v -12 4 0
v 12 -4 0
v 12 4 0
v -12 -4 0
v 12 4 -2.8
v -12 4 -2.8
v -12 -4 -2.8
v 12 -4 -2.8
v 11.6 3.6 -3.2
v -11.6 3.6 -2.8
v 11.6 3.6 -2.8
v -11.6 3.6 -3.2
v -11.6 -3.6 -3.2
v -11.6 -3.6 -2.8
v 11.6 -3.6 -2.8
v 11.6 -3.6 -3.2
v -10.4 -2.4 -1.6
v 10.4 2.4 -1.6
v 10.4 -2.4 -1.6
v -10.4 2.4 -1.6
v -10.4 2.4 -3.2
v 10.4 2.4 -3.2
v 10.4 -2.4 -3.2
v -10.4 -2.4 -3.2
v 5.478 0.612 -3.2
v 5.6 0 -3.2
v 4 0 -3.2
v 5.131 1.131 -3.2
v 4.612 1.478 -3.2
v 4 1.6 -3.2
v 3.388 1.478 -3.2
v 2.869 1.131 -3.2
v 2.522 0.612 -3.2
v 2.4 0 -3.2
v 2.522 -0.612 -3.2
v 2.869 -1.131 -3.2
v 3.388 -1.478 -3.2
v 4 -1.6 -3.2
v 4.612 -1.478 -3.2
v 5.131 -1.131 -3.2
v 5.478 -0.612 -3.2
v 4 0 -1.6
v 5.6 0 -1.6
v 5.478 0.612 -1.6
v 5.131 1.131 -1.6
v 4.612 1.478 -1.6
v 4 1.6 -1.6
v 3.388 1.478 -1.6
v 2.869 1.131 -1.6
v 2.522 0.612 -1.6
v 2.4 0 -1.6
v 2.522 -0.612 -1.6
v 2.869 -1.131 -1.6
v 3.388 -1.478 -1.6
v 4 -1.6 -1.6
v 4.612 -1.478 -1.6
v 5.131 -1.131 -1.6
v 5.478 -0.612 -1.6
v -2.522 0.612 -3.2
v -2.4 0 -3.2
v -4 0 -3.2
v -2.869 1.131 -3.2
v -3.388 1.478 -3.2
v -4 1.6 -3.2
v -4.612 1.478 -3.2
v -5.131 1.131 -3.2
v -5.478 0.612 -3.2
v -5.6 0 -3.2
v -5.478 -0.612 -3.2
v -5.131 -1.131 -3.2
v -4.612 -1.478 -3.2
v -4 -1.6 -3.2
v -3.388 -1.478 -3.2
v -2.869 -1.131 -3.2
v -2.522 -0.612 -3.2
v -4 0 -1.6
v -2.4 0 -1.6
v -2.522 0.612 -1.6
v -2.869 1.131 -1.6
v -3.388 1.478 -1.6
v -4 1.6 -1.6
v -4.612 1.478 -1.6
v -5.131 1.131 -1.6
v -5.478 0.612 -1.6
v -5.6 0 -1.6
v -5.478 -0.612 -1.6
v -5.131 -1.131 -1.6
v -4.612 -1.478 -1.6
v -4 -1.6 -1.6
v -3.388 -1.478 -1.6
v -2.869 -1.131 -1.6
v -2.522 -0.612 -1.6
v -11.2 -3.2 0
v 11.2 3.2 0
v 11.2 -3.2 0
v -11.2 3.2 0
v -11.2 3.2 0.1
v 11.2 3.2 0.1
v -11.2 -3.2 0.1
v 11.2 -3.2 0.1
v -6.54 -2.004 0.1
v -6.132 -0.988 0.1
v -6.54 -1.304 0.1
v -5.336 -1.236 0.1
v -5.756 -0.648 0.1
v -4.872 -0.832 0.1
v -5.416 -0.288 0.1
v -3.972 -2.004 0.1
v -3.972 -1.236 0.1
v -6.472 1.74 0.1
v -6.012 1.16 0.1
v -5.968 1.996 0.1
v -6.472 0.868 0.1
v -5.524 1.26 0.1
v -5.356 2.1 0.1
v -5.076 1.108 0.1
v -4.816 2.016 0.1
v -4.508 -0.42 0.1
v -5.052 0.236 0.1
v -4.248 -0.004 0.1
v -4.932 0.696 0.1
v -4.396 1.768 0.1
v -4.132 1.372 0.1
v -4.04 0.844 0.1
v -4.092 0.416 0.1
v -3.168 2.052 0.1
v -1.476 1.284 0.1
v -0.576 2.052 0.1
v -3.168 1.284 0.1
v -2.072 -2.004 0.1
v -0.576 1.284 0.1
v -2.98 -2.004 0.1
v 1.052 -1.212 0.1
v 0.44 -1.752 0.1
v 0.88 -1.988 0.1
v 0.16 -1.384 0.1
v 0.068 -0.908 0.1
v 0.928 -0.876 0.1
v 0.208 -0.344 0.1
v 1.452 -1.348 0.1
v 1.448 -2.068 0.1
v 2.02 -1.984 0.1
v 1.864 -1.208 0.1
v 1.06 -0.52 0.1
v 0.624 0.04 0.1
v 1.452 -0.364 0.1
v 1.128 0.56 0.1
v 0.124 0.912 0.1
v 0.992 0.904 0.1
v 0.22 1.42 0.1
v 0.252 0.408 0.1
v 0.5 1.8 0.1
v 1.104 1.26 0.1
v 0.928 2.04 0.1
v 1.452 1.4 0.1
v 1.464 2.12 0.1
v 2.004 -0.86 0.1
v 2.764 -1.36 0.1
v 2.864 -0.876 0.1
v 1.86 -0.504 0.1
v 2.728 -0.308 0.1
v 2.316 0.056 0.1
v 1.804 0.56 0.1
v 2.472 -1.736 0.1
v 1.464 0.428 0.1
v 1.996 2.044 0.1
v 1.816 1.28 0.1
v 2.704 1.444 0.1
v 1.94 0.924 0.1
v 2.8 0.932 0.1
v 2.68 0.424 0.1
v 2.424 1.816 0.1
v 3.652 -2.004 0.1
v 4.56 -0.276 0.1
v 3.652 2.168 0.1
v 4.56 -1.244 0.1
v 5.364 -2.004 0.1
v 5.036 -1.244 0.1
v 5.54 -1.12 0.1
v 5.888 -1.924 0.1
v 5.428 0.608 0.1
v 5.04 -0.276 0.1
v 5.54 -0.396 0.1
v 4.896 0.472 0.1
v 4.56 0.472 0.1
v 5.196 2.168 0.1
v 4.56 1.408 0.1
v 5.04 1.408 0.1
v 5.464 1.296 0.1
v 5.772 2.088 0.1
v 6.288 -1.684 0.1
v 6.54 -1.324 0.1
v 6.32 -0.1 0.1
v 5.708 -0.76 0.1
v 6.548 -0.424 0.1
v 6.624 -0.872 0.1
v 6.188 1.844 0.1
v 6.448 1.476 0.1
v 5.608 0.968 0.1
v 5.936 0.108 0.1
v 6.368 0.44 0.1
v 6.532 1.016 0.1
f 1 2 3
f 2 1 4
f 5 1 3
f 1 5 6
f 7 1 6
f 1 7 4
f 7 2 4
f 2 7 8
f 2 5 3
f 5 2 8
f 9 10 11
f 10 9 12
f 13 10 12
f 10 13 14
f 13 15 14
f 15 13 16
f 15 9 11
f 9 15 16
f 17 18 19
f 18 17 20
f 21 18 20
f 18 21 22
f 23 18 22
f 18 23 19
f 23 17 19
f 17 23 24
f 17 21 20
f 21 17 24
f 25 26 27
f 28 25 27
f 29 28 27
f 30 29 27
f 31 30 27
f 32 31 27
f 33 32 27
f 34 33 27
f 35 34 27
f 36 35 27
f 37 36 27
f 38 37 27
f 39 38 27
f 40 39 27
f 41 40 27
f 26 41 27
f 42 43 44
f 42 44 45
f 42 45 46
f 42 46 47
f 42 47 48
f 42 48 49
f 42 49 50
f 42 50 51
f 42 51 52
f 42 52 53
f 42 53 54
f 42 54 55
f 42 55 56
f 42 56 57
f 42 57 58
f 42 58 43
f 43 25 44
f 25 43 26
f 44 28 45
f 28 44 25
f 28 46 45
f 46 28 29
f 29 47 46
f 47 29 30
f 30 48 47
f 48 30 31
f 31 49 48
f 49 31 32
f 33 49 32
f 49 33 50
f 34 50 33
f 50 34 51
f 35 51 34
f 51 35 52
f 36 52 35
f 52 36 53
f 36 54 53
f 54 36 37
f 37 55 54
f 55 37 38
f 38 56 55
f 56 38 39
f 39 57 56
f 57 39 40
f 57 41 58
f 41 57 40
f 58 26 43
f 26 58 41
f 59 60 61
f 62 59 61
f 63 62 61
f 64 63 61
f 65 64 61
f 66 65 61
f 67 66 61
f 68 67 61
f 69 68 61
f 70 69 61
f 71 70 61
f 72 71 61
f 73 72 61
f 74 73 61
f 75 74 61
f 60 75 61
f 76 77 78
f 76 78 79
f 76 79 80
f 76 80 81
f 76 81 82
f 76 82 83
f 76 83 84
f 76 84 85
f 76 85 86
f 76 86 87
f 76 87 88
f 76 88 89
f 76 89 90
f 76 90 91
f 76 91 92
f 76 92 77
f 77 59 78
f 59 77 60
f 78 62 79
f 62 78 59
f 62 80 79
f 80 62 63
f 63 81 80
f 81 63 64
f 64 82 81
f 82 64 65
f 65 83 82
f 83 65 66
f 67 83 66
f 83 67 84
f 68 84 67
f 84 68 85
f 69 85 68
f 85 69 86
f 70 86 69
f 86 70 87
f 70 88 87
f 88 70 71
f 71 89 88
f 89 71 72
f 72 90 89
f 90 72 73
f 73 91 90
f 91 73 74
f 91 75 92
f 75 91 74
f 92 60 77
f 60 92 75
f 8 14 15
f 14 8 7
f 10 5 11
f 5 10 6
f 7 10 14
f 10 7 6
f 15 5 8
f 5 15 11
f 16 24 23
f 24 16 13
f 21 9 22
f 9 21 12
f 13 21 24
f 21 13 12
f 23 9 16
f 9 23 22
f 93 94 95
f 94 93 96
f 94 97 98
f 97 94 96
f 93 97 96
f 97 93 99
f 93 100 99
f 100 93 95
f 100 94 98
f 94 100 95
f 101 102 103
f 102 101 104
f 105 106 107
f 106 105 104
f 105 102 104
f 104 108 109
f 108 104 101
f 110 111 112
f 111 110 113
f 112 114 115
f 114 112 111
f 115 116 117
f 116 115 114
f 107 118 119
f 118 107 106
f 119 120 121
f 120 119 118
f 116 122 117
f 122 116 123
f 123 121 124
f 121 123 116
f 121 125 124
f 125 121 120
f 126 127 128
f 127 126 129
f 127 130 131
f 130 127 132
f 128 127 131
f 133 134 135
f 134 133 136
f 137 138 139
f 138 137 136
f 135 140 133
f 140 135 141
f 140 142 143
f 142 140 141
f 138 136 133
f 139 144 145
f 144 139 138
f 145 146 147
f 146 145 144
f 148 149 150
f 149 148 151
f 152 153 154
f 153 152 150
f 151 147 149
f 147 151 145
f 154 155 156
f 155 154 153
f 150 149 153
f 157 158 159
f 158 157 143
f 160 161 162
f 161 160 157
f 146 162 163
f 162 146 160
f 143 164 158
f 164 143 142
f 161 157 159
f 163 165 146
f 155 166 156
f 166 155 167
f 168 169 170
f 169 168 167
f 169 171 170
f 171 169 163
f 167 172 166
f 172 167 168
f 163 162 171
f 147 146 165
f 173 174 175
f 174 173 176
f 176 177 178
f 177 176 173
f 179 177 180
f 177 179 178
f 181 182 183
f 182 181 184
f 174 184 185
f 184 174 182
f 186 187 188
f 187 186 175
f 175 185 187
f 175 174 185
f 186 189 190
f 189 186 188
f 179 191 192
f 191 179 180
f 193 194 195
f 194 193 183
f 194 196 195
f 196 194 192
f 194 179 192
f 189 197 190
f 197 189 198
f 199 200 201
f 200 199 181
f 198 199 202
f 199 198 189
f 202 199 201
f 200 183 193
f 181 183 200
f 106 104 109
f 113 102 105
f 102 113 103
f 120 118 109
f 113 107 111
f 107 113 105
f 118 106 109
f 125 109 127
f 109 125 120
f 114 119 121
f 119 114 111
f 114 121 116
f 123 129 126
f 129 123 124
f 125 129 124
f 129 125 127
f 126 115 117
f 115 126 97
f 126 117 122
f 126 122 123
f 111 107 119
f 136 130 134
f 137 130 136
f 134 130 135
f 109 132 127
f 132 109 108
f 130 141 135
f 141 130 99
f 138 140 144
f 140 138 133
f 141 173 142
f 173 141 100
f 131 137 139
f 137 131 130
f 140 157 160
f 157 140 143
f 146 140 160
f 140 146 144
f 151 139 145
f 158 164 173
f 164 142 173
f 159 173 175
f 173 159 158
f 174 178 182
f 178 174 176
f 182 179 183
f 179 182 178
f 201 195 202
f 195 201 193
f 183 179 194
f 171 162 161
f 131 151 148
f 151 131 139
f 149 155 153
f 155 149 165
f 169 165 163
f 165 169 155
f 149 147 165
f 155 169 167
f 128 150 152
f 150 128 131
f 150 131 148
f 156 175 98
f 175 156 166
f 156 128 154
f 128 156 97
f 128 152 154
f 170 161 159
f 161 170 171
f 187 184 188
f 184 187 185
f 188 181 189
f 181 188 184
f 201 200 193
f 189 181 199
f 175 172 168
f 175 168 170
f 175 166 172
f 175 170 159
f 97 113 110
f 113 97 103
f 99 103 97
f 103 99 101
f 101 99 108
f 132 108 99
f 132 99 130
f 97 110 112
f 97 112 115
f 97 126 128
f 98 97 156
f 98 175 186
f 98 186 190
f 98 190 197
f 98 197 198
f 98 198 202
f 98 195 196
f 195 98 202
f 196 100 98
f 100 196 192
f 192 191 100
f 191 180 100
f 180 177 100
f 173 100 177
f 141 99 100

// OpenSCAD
// file: ../p/4-4edge.scad
use <../lib.scad>
function ldraw_lib__4_4edge() = [
// 0 Circle 1.0
// 0 Name: 4-4edge.dat
// 0 Author: James Jessiman
// 0 !LDRAW_ORG Primitive UPDATE 2017-01
// 0 !LICENSE Licensed under CC BY 2.0 and CC BY 4.0 : see CAreadme.txt
// 
// 0 BFC CERTIFY CCW
  [0,"BFC","CERTIFY"],
  [0,"BFC","CCW"],
// 
// 0 !HISTORY 1998-12-15 [PTadmin] Official Update 1998-10
// 0 !HISTORY 2005-12-28 [PTadmin] Official Update 2005-01
// 0 !HISTORY 2007-06-24 [PTadmin] Header formatted for Contributor Agreement
// 0 !HISTORY 2008-07-01 [PTadmin] Official Update 2008-01
// 0 !HISTORY 2017-01-15 [Steffen] BFCed
// 0 !HISTORY 2017-12-30 [PTadmin] Official Update 2017-01
// 
// 
// 2 24 1 0 0 0.9239 0 0.3827
  [2,24,1,0,0,0.9239,0,0.3827],
// 2 24 0.9239 0 0.3827 0.7071 0 0.7071
  [2,24,0.9239,0,0.3827,0.7071,0,0.7071],
// 2 24 0.7071 0 0.7071 0.3827 0 0.9239
  [2,24,0.7071,0,0.7071,0.3827,0,0.9239],
// 2 24 0.3827 0 0.9239 0 0 1
  [2,24,0.3827,0,0.9239,0,0,1],
// 2 24 0 0 1 -0.3827 0 0.9239
  [2,24,0,0,1,-0.3827,0,0.9239],
// 2 24 -0.3827 0 0.9239 -0.7071 0 0.7071
  [2,24,-0.3827,0,0.9239,-0.7071,0,0.7071],
// 2 24 -0.7071 0 0.7071 -0.9239 0 0.3827
  [2,24,-0.7071,0,0.7071,-0.9239,0,0.3827],
// 2 24 -0.9239 0 0.3827 -1 0 -0
  [2,24,-0.9239,0,0.3827,-1,0,-0],
// 2 24 -1 0 -0 -0.9239 0 -0.3827
  [2,24,-1,0,-0,-0.9239,0,-0.3827],
// 2 24 -0.9239 0 -0.3827 -0.7071 0 -0.7071
  [2,24,-0.9239,0,-0.3827,-0.7071,0,-0.7071],
// 2 24 -0.7071 0 -0.7071 -0.3827 0 -0.9239
  [2,24,-0.7071,0,-0.7071,-0.3827,0,-0.9239],
// 2 24 -0.3827 0 -0.9239 0 0 -1
  [2,24,-0.3827,0,-0.9239,0,0,-1],
// 2 24 0 0 -1 0.3827 0 -0.9239
  [2,24,0,0,-1,0.3827,0,-0.9239],
// 2 24 0.3827 0 -0.9239 0.7071 0 -0.7071
  [2,24,0.3827,0,-0.9239,0.7071,0,-0.7071],
// 2 24 0.7071 0 -0.7071 0.9239 0 -0.3827
  [2,24,0.7071,0,-0.7071,0.9239,0,-0.3827],
// 2 24 0.9239 0 -0.3827 1 0 0
  [2,24,0.9239,0,-0.3827,1,0,0],
];
module ldraw_lib__4_4edge(step=0, col=false, unit=2/5, alt=false, line=0.2, solid=!$preview)
    makepoly(ldraw_lib__4_4edge(), step=step, col=col, unit=unit, alt=alt, line=line, solid=solid);
ldraw_lib__4_4edge(line=0.2);
// file: ../p/4-4disc.scad
use <../lib.scad>
function ldraw_lib__4_4disc() = [
// 0 Disc 1.0
// 0 Name: 4-4disc.dat
// 0 Author: James Jessiman
// 0 !LDRAW_ORG Primitive UPDATE 2002-02
// 0 !LICENSE Licensed under CC BY 2.0 and CC BY 4.0 : see CAreadme.txt
// 
// 0 BFC CERTIFY CCW
  [0,"BFC","CERTIFY"],
  [0,"BFC","CCW"],
// 
// 0 !HISTORY 1998-12-15 [PTadmin] Official Update 1998-10
// 0 !HISTORY 2002-03-23 [sbliss] Added BFC statement
// 0 !HISTORY 2002-04-25 [PTadmin] Official Update 2002-02
// 0 !HISTORY 2007-06-24 [PTadmin] Header formatted for Contributor Agreement
// 0 !HISTORY 2008-07-01 [PTadmin] Official Update 2008-01
// 
// 
// 3 16 0 0 0 1 0 0 0.9239 0 0.3827
  [3,16,0,0,0,1,0,0,0.9239,0,0.3827],
// 3 16 0 0 0 0.9239 0 0.3827 0.7071 0 0.7071
  [3,16,0,0,0,0.9239,0,0.3827,0.7071,0,0.7071],
// 3 16 0 0 0 0.7071 0 0.7071 0.3827 0 0.9239
  [3,16,0,0,0,0.7071,0,0.7071,0.3827,0,0.9239],
// 3 16 0 0 0 0.3827 0 0.9239 0 0 1
  [3,16,0,0,0,0.3827,0,0.9239,0,0,1],
// 3 16 0 0 0 0 0 1 -0.3827 0 0.9239
  [3,16,0,0,0,0,0,1,-0.3827,0,0.9239],
// 3 16 0 0 0 -0.3827 0 0.9239 -0.7071 0 0.7071
  [3,16,0,0,0,-0.3827,0,0.9239,-0.7071,0,0.7071],
// 3 16 0 0 0 -0.7071 0 0.7071 -0.9239 0 0.3827
  [3,16,0,0,0,-0.7071,0,0.7071,-0.9239,0,0.3827],
// 3 16 0 0 0 -0.9239 0 0.3827 -1 0 -0
  [3,16,0,0,0,-0.9239,0,0.3827,-1,0,-0],
// 3 16 0 0 0 -1 0 -0 -0.9239 0 -0.3827
  [3,16,0,0,0,-1,0,-0,-0.9239,0,-0.3827],
// 3 16 0 0 0 -0.9239 0 -0.3827 -0.7071 0 -0.7071
  [3,16,0,0,0,-0.9239,0,-0.3827,-0.7071,0,-0.7071],
// 3 16 0 0 0 -0.7071 0 -0.7071 -0.3827 0 -0.9239
  [3,16,0,0,0,-0.7071,0,-0.7071,-0.3827,0,-0.9239],
// 3 16 0 0 0 -0.3827 0 -0.9239 0 0 -1
  [3,16,0,0,0,-0.3827,0,-0.9239,0,0,-1],
// 3 16 0 0 0 0 0 -1 0.3827 0 -0.9239
  [3,16,0,0,0,0,0,-1,0.3827,0,-0.9239],
// 3 16 0 0 0 0.3827 0 -0.9239 0.7071 0 -0.7071
  [3,16,0,0,0,0.3827,0,-0.9239,0.7071,0,-0.7071],
// 3 16 0 0 0 0.7071 0 -0.7071 0.9239 0 -0.3827
  [3,16,0,0,0,0.7071,0,-0.7071,0.9239,0,-0.3827],
// 3 16 0 0 0 0.9239 0 -0.3827 1 0 0
  [3,16,0,0,0,0.9239,0,-0.3827,1,0,0],
// 0
];
module ldraw_lib__4_4disc(step=0, col=false, unit=2/5, alt=false, line=0.2, solid=!$preview)
    makepoly(ldraw_lib__4_4disc(), step=step, col=col, unit=unit, alt=alt, line=line, solid=solid);
ldraw_lib__4_4disc(line=0.2);
// file: ../p/4-4cyli.scad
use <../lib.scad>
$fa=1; $fs=0.2;
function ldraw_lib__4_4cyli(realsolid=false) = [
// 0 Cylinder 1.0
// 0 Name: 4-4cyli.dat
// 0 Author: James Jessiman
// 0 !LDRAW_ORG Primitive UPDATE 2005-01
// 0 !LICENSE Licensed under CC BY 2.0 and CC BY 4.0 : see CAreadme.txt
// 
// 0 BFC CERTIFY CCW
  [0,"BFC","CERTIFY"],
  [0,"BFC","CCW"],
// 
// 0 !HISTORY 1998-12-15 [PTadmin] Official Update 1998-10
// 0 !HISTORY 2002-03-23 [sbliss] Added BFC statement; merged headers from files in distributions LDraw 0.27 and Complete.
// 0 !HISTORY 2002-04-25 [PTadmin] Official Update 2002-02
// 0 !HISTORY 2004-12-14 [guyvivan] BFC CCW
// 0 !HISTORY 2005-12-28 [PTadmin] Official Update 2005-01
// 0 !HISTORY 2007-06-24 [PTadmin] Header formatted for Contributor Agreement
// 0 !HISTORY 2008-07-01 [PTadmin] Official Update 2008-01
// 
// 
// 4 16 1 1 0 0.9239 1 0.3827 0.9239 0 0.3827 1 0 0
  [4,16,1,1,0,0.9239,1,0.3827,0.9239,0,0.3827,1,0,0],
// 5 24 1 0 0 1 1 0 0.9239 0 0.3827 0.9239 0 -0.3827
  [5,24,1,0,0,1,1,0,0.9239,0,0.3827,0.9239,0,-0.3827],
// 4 16 0.9239 1 0.3827 0.7071 1 0.7071 0.7071 0 0.7071 0.9239 0 0.3827
  [4,16,0.9239,1,0.3827,0.7071,1,0.7071,0.7071,0,0.7071,0.9239,0,0.3827],
// 5 24 0.9239 0 0.3827 0.9239 1 0.3827 0.7071 0 0.7071 1 0 0
  [5,24,0.9239,0,0.3827,0.9239,1,0.3827,0.7071,0,0.7071,1,0,0],
// 4 16 0.7071 1 0.7071 0.3827 1 0.9239 0.3827 0 0.9239 0.7071 0 0.7071
  [4,16,0.7071,1,0.7071,0.3827,1,0.9239,0.3827,0,0.9239,0.7071,0,0.7071],
// 5 24 0.7071 0 0.7071 0.7071 1 0.7071 0.3827 0 0.9239 0.9239 0 0.3827
  [5,24,0.7071,0,0.7071,0.7071,1,0.7071,0.3827,0,0.9239,0.9239,0,0.3827],
// 4 16 0.3827 1 0.9239 0 1 1 0 0 1 0.3827 0 0.9239
  [4,16,0.3827,1,0.9239,0,1,1,0,0,1,0.3827,0,0.9239],
// 5 24 0.3827 0 0.9239 0.3827 1 0.9239 0 0 1 0.7071 0 0.7071
  [5,24,0.3827,0,0.9239,0.3827,1,0.9239,0,0,1,0.7071,0,0.7071],
// 4 16 0 1 1 -0.3827 1 0.9239 -0.3827 0 0.9239 0 0 1
  [4,16,0,1,1,-0.3827,1,0.9239,-0.3827,0,0.9239,0,0,1],
// 5 24 0 0 1 0 1 1 -0.3827 0 0.9239 0.3827 0 0.9239
  [5,24,0,0,1,0,1,1,-0.3827,0,0.9239,0.3827,0,0.9239],
// 4 16 -0.3827 1 0.9239 -0.7071 1 0.7071 -0.7071 0 0.7071 -0.3827 0 0.9239
  [4,16,-0.3827,1,0.9239,-0.7071,1,0.7071,-0.7071,0,0.7071,-0.3827,0,0.9239],
// 5 24 -0.3827 0 0.9239 -0.3827 1 0.9239 -0.7071 0 0.7071 0 0 1
  [5,24,-0.3827,0,0.9239,-0.3827,1,0.9239,-0.7071,0,0.7071,0,0,1],
// 4 16 -0.7071 1 0.7071 -0.9239 1 0.3827 -0.9239 0 0.3827 -0.7071 0 0.7071
  [4,16,-0.7071,1,0.7071,-0.9239,1,0.3827,-0.9239,0,0.3827,-0.7071,0,0.7071],
// 5 24 -0.7071 0 0.7071 -0.7071 1 0.7071 -0.9239 0 0.3827 -0.3827 0 0.9239
  [5,24,-0.7071,0,0.7071,-0.7071,1,0.7071,-0.9239,0,0.3827,-0.3827,0,0.9239],
// 4 16 -0.9239 1 0.3827 -1 1 0 -1 0 0 -0.9239 0 0.3827
  [4,16,-0.9239,1,0.3827,-1,1,0,-1,0,0,-0.9239,0,0.3827],
// 5 24 -0.9239 0 0.3827 -0.9239 1 0.3827 -1 0 0 -0.7071 0 0.7071
  [5,24,-0.9239,0,0.3827,-0.9239,1,0.3827,-1,0,0,-0.7071,0,0.7071],
// 4 16 -1 1 0 -0.9239 1 -0.3827 -0.9239 0 -0.3827 -1 0 0
  [4,16,-1,1,0,-0.9239,1,-0.3827,-0.9239,0,-0.3827,-1,0,0],
// 5 24 -1 0 0 -1 1 0 -0.9239 0 -0.3827 -0.9239 0 0.3827
  [5,24,-1,0,0,-1,1,0,-0.9239,0,-0.3827,-0.9239,0,0.3827],
// 4 16 -0.9239 1 -0.3827 -0.7071 1 -0.7071 -0.7071 0 -0.7071 -0.9239 0 -0.3827
  [4,16,-0.9239,1,-0.3827,-0.7071,1,-0.7071,-0.7071,0,-0.7071,-0.9239,0,-0.3827],
// 5 24 -0.9239 0 -0.3827 -0.9239 1 -0.3827 -0.7071 0 -0.7071 -1 0 0
  [5,24,-0.9239,0,-0.3827,-0.9239,1,-0.3827,-0.7071,0,-0.7071,-1,0,0],
// 4 16 -0.7071 1 -0.7071 -0.3827 1 -0.9239 -0.3827 0 -0.9239 -0.7071 0 -0.7071
  [4,16,-0.7071,1,-0.7071,-0.3827,1,-0.9239,-0.3827,0,-0.9239,-0.7071,0,-0.7071],
// 5 24 -0.7071 0 -0.7071 -0.7071 1 -0.7071 -0.3827 0 -0.9239 -0.9239 0 -0.3827
  [5,24,-0.7071,0,-0.7071,-0.7071,1,-0.7071,-0.3827,0,-0.9239,-0.9239,0,-0.3827],
// 4 16 -0.3827 1 -0.9239 0 1 -1 0 0 -1 -0.3827 0 -0.9239
  [4,16,-0.3827,1,-0.9239,0,1,-1,0,0,-1,-0.3827,0,-0.9239],
// 5 24 -0.3827 0 -0.9239 -0.3827 1 -0.9239 0 0 -1 -0.7071 0 -0.7071
  [5,24,-0.3827,0,-0.9239,-0.3827,1,-0.9239,0,0,-1,-0.7071,0,-0.7071],
// 4 16 0 1 -1 0.3827 1 -0.9239 0.3827 0 -0.9239 0 0 -1
  [4,16,0,1,-1,0.3827,1,-0.9239,0.3827,0,-0.9239,0,0,-1],
// 5 24 0 0 -1 0 1 -1 0.3827 0 -0.9239 -0.3827 0 -0.9239
  [5,24,0,0,-1,0,1,-1,0.3827,0,-0.9239,-0.3827,0,-0.9239],
// 4 16 0.3827 1 -0.9239 0.7071 1 -0.7071 0.7071 0 -0.7071 0.3827 0 -0.9239
  [4,16,0.3827,1,-0.9239,0.7071,1,-0.7071,0.7071,0,-0.7071,0.3827,0,-0.9239],
// 5 24 0.3827 0 -0.9239 0.3827 1 -0.9239 0.7071 0 -0.7071 0 0 -1
  [5,24,0.3827,0,-0.9239,0.3827,1,-0.9239,0.7071,0,-0.7071,0,0,-1],
// 4 16 0.7071 1 -0.7071 0.9239 1 -0.3827 0.9239 0 -0.3827 0.7071 0 -0.7071
  [4,16,0.7071,1,-0.7071,0.9239,1,-0.3827,0.9239,0,-0.3827,0.7071,0,-0.7071],
// 5 24 0.7071 0 -0.7071 0.7071 1 -0.7071 0.9239 0 -0.3827 0.3827 0 -0.9239
  [5,24,0.7071,0,-0.7071,0.7071,1,-0.7071,0.9239,0,-0.3827,0.3827,0,-0.9239],
// 4 16 0.9239 1 -0.3827 1 1 0 1 0 0 0.9239 0 -0.3827
  [4,16,0.9239,1,-0.3827,1,1,0,1,0,0,0.9239,0,-0.3827],
// 5 24 0.9239 0 -0.3827 0.9239 1 -0.3827 1 0 0 0.7071 0 -0.7071
  [5,24,0.9239,0,-0.3827,0.9239,1,-0.3827,1,0,0,0.7071,0,-0.7071],
// 0
];
module ldraw_lib__4_4cyli(step=0, col=false, unit=2/5, alt=false, line=0.2, solid=!$preview)
    makepoly(ldraw_lib__4_4cyli(solid), step=step, col=col, unit=unit, alt=alt, line=line, solid=solid);
ldraw_lib__4_4cyli(line=0.2);
// file: ../p/stud3.scad
use <../lib.scad>
use <4-4cyli.scad>
use <4-4disc.scad>
use <4-4edge.scad>
function ldraw_lib__stud3() = [
// 0 Stud Tube Solid
// 0 Name: stud3.dat
// 0 Author: James Jessiman
// 0 !LDRAW_ORG Primitive UPDATE 2012-01
// 0 !LICENSE Licensed under CC BY 4.0 : see CAreadme.txt
// 
// 0 BFC CERTIFY CCW
  [0,"BFC","CERTIFY"],
  [0,"BFC","CCW"],
// 
// 0 !HISTORY 2002-04-04 [sbliss] Modified for BFC compliance
// 0 !HISTORY 2002-04-25 [PTadmin] Official Update 2002-02
// 0 !HISTORY 2007-06-24 [PTadmin] Header formatted for Contributor Agreement
// 0 !HISTORY 2008-07-01 [PTadmin] Official Update 2008-01
// 0 !HISTORY 2012-02-16 [Philo] Changed to CCW
// 0 !HISTORY 2012-03-30 [PTadmin] Official Update 2012-01
// 
// 
// 1 16 0 -4 0 4 0 0 0 1 0 0 0 4 4-4edge.dat
  [1,16,0,-4,0,4,0,0,0,1,0,0,0,4, ldraw_lib__4_4edge()],
// 1 16 0 0 0 4 0 0 0 1 0 0 0 4 4-4edge.dat
  [1,16,0,0,0,4,0,0,0,1,0,0,0,4, ldraw_lib__4_4edge()],
// 1 16 0 -4 0 4 0 0 0 1 0 0 0 4 4-4disc.dat
  [1,16,0,-4,0,4,0,0,0,1,0,0,0,4, ldraw_lib__4_4disc()],
  [-1,16,0,0,0,4,0,0,0,-1,0,0,0,4, ldraw_lib__4_4disc()],
// 1 16 0 -4 0 4 0 0 0 4 0 0 0 4 4-4cyli.dat
  [1,16,0,-4,0,4,0,0,0,4,0,0,0,4, ldraw_lib__4_4cyli()],
];
module ldraw_lib__stud3(step=0, col=false, unit=2/5, alt=false, line=0.2, solid=!$preview)
    makepoly(ldraw_lib__stud3(), step=step, col=col, unit=unit, alt=alt, line=line, solid=solid);
ldraw_lib__stud3(line=0.2);
// file: ../p/box5.scad
use <../lib.scad>
function ldraw_lib__box5() = [
// 0 Box with 5 Faces and All Edges
// 0 Name: box5.dat
// 0 Author: James Jessiman
// 0 !LDRAW_ORG Primitive UPDATE 2012-01
// 0 !LICENSE Licensed under CC BY 2.0 and CC BY 4.0 : see CAreadme.txt
// 
// 0 BFC CERTIFY CCW
  [0,"BFC","CERTIFY"],
  [0,"BFC","CCW"],
// 
// 0 !HISTORY 2002-04-03 [sbliss] Modified for BFC compliance
// 0 !HISTORY 2002-04-25 [PTadmin] Official Update 2002-02
// 0 !HISTORY 2007-06-24 [PTadmin] Header formatted for Contributor Agreement
// 0 !HISTORY 2008-07-01 [PTadmin] Official Update 2008-01
// 0 !HISTORY 2012-02-16 [Philo] Changed to CCW
// 0 !HISTORY 2012-03-30 [PTadmin] Official Update 2012-01
// 
// 
// 2 24 1 1 1 -1 1 1
  [2,24,1,1,1,-1,1,1],
// 2 24 -1 1 1 -1 1 -1
  [2,24,-1,1,1,-1,1,-1],
// 2 24 -1 1 -1 1 1 -1
  [2,24,-1,1,-1,1,1,-1],
// 2 24 1 1 -1 1 1 1
  [2,24,1,1,-1,1,1,1],
// 2 24 1 0 1 -1 0 1
  [2,24,1,0,1,-1,0,1],
// 2 24 -1 0 1 -1 0 -1
  [2,24,-1,0,1,-1,0,-1],
// 2 24 -1 0 -1 1 0 -1
  [2,24,-1,0,-1,1,0,-1],
// 2 24 1 0 -1 1 0 1
  [2,24,1,0,-1,1,0,1],
// 2 24 1 0 1 1 1 1
  [2,24,1,0,1,1,1,1],
// 2 24 -1 0 1 -1 1 1
  [2,24,-1,0,1,-1,1,1],
// 2 24 1 0 -1 1 1 -1
  [2,24,1,0,-1,1,1,-1],
// 2 24 -1 0 -1 -1 1 -1
  [2,24,-1,0,-1,-1,1,-1],
// 4 16 -1 1 1 1 1 1 1 1 -1 -1 1 -1
  [4,16,-1,1,1,1,1,1,1,1,-1,-1,1,-1],
// 4 16 -1 1 1 -1 0 1 1 0 1 1 1 1
  [4,16,-1,1,1,-1,0,1,1,0,1,1,1,1],
// 4 16 -1 1 -1 -1 0 -1 -1 0 1 -1 1 1
  [4,16,-1,1,-1,-1,0,-1,-1,0,1,-1,1,1],
// 4 16 1 1 -1 1 0 -1 -1 0 -1 -1 1 -1
  [4,16,1,1,-1,1,0,-1,-1,0,-1,-1,1,-1],
// 4 16 1 1 1 1 0 1 1 0 -1 1 1 -1
  [4,16,1,1,1,1,0,1,1,0,-1,1,1,-1],
];
makepoly(ldraw_lib__box5(), line=0.2);
// file: ../p/box4.scad
use <../lib.scad>
function ldraw_lib__box4() = [
// 0 Box with 4 Faces (2 Parallel Pairs) and All Edges
// 0 Name: box4.dat
// 0 Author: James Jessiman
// 0 !LDRAW_ORG Primitive UPDATE 2012-01
// 0 !LICENSE Licensed under CC BY 4.0 : see CAreadme.txt
// 
// 0 BFC CERTIFY CCW
  [0,"BFC","CERTIFY"],
  [0,"BFC","CCW"],
// 
// 0 !HISTORY 2002-04-03 [sbliss] Modified for BFC compliance
// 0 !HISTORY 2002-04-25 [PTadmin] Official Update 2002-02
// 0 !HISTORY 2007-06-24 [PTadmin] Header formatted for Contributor Agreement
// 0 !HISTORY 2008-07-01 [PTadmin] Official Update 2008-01
// 0 !HISTORY 2012-02-16 [Philo] Changed to CCW
// 0 !HISTORY 2012-03-30 [PTadmin] Official Update 2012-01
// 
// 
// 2 24 1 1 1 -1 1 1
  [2,24,1,1,1,-1,1,1],
// 2 24 -1 1 1 -1 1 -1
  [2,24,-1,1,1,-1,1,-1],
// 2 24 -1 1 -1 1 1 -1
  [2,24,-1,1,-1,1,1,-1],
// 2 24 1 1 -1 1 1 1
  [2,24,1,1,-1,1,1,1],
// 2 24 1 0 1 -1 0 1
  [2,24,1,0,1,-1,0,1],
// 2 24 -1 0 1 -1 0 -1
  [2,24,-1,0,1,-1,0,-1],
// 2 24 -1 0 -1 1 0 -1
  [2,24,-1,0,-1,1,0,-1],
// 2 24 1 0 -1 1 0 1
  [2,24,1,0,-1,1,0,1],
// 2 24 1 0 1 1 1 1
  [2,24,1,0,1,1,1,1],
// 2 24 -1 0 1 -1 1 1
  [2,24,-1,0,1,-1,1,1],
// 2 24 1 0 -1 1 1 -1
  [2,24,1,0,-1,1,1,-1],
// 2 24 -1 0 -1 -1 1 -1
  [2,24,-1,0,-1,-1,1,-1],
// 4 16 -1 1 1 -1 0 1 1 0 1 1 1 1
  [4,16,-1,1,1,-1,0,1,1,0,1,1,1,1],
// 4 16 -1 1 -1 -1 0 -1 -1 0 1 -1 1 1
  [4,16,-1,1,-1,-1,0,-1,-1,0,1,-1,1,1],
// 4 16 1 1 -1 1 0 -1 -1 0 -1 -1 1 -1
  [4,16,1,1,-1,1,0,-1,-1,0,-1,-1,1,-1],
// 4 16 1 1 1 1 0 1 1 0 -1 1 1 -1
  [4,16,1,1,1,1,0,1,1,0,-1,1,1,-1],
];
module ldraw_lib__box4(step=0, col=false, unit=2/5, alt=false, line=0.2, solid=!$preview)
    makepoly(ldraw_lib__box4(), step=step, col=col, unit=unit, alt=alt, line=line, solid=solid);
ldraw_lib__box4(line=0.2);
// file: s/63864s01.scad
use <../../lib.scad>
use <../../p/box4.scad>
use <../../p/box5.scad>
use <../../p/stud3.scad>
function ldraw_lib__s__63864s01() = [
// 0 ~Tile  1 x  3 without Top Face
// 0 Name: s\63864s01.dat
// 0 Author: Ulrich Röder [UR]
// 0 !LDRAW_ORG Subpart UPDATE 2019-01
// 0 !LICENSE Licensed under CC BY 4.0 : see CAreadme.txt
// 
// 0 BFC CERTIFY CCW
  [0,"BFC","CERTIFY"],
  [0,"BFC","CCW"],
// 
// 0 !HISTORY 2019-06-28 [PTadmin] Official Update 2019-01
// 
// 
// 1 16 0 0 0 30 0 0 0 7 0 0 0 10 box4.dat
  [1,16,0,0,0,30,0,0,0,7,0,0,0,10, ldraw_lib__box4()],
// 1 16 0 7 0 29 0 0 0 1 0 0 0 9 box4.dat
  [1,16,0,7,0,29,0,0,0,1,0,0,0,9, ldraw_lib__box4()],
// 0 BFC INVERTNEXT
  [0,"BFC","INVERTNEXT"],
// 1 16 0 8 0 -26 0 0 0 -4 0 0 0 6 box5.dat
  [1,16,0,8,0,-26,0,0,0,-4,0,0,0,6, ldraw_lib__box5()],
// 1 16 10 4 0 1 0 0 0 -1 0 0 0 1 stud3.dat
  [1,16,10,4,0,1,0,0,0,-1,0,0,0,1, ldraw_lib__stud3()],
// 1 16 -10 4 0 1 0 0 0 -1 0 0 0 1 stud3.dat
  [1,16,-10,4,0,1,0,0,0,-1,0,0,0,1, ldraw_lib__stud3()],
// 4 16 -30 7 -10 -29 7 -9 29 7 -9 30 7 -10
  [4,16,-30,7,-10,-29,7,-9,29,7,-9,30,7,-10],
// 4 16 30 7 10 29 7 9 -29 7 9 -30 7 10
  [4,16,30,7,10,29,7,9,-29,7,9,-30,7,10],
// 4 16 -30 7 -10 -30 7 10 -29 7 9 -29 7 -9
  [4,16,-30,7,-10,-30,7,10,-29,7,9,-29,7,-9],
// 4 16 30 7 10 30 7 -10 29 7 -9 29 7 9
  [4,16,30,7,10,30,7,-10,29,7,-9,29,7,9],
// 4 16 -29 8 -9 -26 8 -6 26 8 -6 29 8 -9
  [4,16,-29,8,-9,-26,8,-6,26,8,-6,29,8,-9],
// 4 16 29 8 9 26 8 6 -26 8 6 -29 8 9
  [4,16,29,8,9,26,8,6,-26,8,6,-29,8,9],
// 4 16 -29 8 -9 -29 8 9 -26 8 6 -26 8 -6
  [4,16,-29,8,-9,-29,8,9,-26,8,6,-26,8,-6],
// 4 16 29 8 9 29 8 -9 26 8 -6 26 8 6
  [4,16,29,8,9,29,8,-9,26,8,-6,26,8,6],
];
module ldraw_lib__s__63864s01(step=0, col=false, unit=2/5, alt=false, line=0.2, solid=!$preview)
    makepoly(ldraw_lib__s__63864s01(), step=step, col=col, unit=unit, alt=alt, line=line, solid=solid);
ldraw_lib__s__63864s01(line=0.2);
// file: ../p/box5-12.scad
use <../lib.scad>
function ldraw_lib__box5_12() = [
// 0 Box with 5 Faces without Any Edges
// 0 Name: box5-12.dat
// 0 Author: Chris Dee [cwdee]
// 0 !LDRAW_ORG Primitive UPDATE 2009-02
// 0 !LICENSE Licensed under CC BY 2.0 and CC BY 4.0 : see CAreadme.txt
// 
// 0 BFC CERTIFY CCW
  [0,"BFC","CERTIFY"],
  [0,"BFC","CCW"],
// 
// 0 !HISTORY 2009-09-03 [PTadmin] Official Update 2009-02
// 
// 
// 4 16 1 1 1 1 1 -1 -1 1 -1 -1 1 1
  [4,16,1,1,1,1,1,-1,-1,1,-1,-1,1,1],
// 4 16 -1 0 1 1 0 1 1 1 1 -1 1 1
  [4,16,-1,0,1,1,0,1,1,1,1,-1,1,1],
// 4 16 -1 0 -1 -1 0 1 -1 1 1 -1 1 -1
  [4,16,-1,0,-1,-1,0,1,-1,1,1,-1,1,-1],
// 4 16 1 0 -1 -1 0 -1 -1 1 -1 1 1 -1
  [4,16,1,0,-1,-1,0,-1,-1,1,-1,1,1,-1],
// 4 16 1 0 1 1 0 -1 1 1 -1 1 1 1
  [4,16,1,0,1,1,0,-1,1,1,-1,1,1,1],
// 0
];
module ldraw_lib__box5_12(step=0, col=false, unit=2/5, alt=false, line=0.2, solid=!$preview)
    makepoly(ldraw_lib__box5_12(), step=step, col=col, unit=unit, alt=alt, line=line, solid=solid);
ldraw_lib__box5_12(line=0.2);
// file: 63864.scad
use <../lib.scad>
use <s/63864s01.scad>
function ldraw_lib__63864() = [
// 0 Tile  1 x  3
// 0 Name: 63864.dat
// 0 Author: Tim Gould [timgould]
// 0 !LDRAW_ORG Part UPDATE 2019-01
// 0 !LICENSE Licensed under CC BY 2.0 and CC BY 4.0 : see CAreadme.txt
// 
// 0 BFC CERTIFY CCW
  [0,"BFC","CERTIFY"],
  [0,"BFC","CCW"],
// 
// 0 !HISTORY 2010-04-05 [PTadmin] Official Update 2010-01
// 0 !HISTORY 2019-06-28 [PTadmin] Official Update 2019-01
// 0 !HISTORY 2019-07-03 [UR] Subpart Integration
// 
// 
// 4 16 -30 0 -10 30 0 -10 30 0 10 -30 0 10
  [4,16,-30,0,-10,30,0,-10,30,0,10,-30,0,10],
// 1 16 0 0 0 1 0 0 0 1 0 0 0 1 s\63864s01.dat
  [1,16,0,0,0,1,0,0,0,1,0,0,0,1, ldraw_lib__s__63864s01()],
];
makepoly(ldraw_lib__63864(), line=0.2);
// main file
use <../lib.scad>
use <6153754h.scad>
use <63864.scad>
function ldraw_lib__63864d0c() = [
// 0 Tile  1 x  3 with White "278B" on Black Background Sticker
// 0 Name: 63864d0c.dat
// 0 Author: Evert-Jan Boer [ejboer]
// 0 !LDRAW_ORG Shortcut UPDATE 2026-07
// 0 !LICENSE Licensed under CC BY 4.0 : see CAreadme.txt
// 
// 0 BFC CERTIFY CCW
  [0,"BFC","CERTIFY"],
  [0,"BFC","CCW"],
// 
// 0 !CATEGORY Sticker Shortcut
// 0 !KEYWORDS Bricklink 63864pb064, set 10252, Volkswagen Beetle
// 
// 0 !HISTORY 2026-07-30 [OrionP] Official Update 2026-07
// 
// 1 16 0 0 0 1 0 0 0 1 0 0 0 1 63864.dat
  [1,16,0,0,0,1,0,0,0,1,0,0,0,1, ldraw_lib__63864()],
// 1 16 0 0 0 1 0 0 0 1 0 0 0 1 6153754h.dat
  [1,16,0,0,0,1,0,0,0,1,0,0,0,1, ldraw_lib__6153754h()],
];
module ldraw_lib__63864d0c(step=0, col=false, unit=2/5, alt=false, line=0.2, solid=!$preview)
    makepoly(ldraw_lib__63864d0c(), step=step, col=col, unit=unit, alt=alt, line=line, solid=solid);
ldraw_lib__63864d0c(line=0.2);
